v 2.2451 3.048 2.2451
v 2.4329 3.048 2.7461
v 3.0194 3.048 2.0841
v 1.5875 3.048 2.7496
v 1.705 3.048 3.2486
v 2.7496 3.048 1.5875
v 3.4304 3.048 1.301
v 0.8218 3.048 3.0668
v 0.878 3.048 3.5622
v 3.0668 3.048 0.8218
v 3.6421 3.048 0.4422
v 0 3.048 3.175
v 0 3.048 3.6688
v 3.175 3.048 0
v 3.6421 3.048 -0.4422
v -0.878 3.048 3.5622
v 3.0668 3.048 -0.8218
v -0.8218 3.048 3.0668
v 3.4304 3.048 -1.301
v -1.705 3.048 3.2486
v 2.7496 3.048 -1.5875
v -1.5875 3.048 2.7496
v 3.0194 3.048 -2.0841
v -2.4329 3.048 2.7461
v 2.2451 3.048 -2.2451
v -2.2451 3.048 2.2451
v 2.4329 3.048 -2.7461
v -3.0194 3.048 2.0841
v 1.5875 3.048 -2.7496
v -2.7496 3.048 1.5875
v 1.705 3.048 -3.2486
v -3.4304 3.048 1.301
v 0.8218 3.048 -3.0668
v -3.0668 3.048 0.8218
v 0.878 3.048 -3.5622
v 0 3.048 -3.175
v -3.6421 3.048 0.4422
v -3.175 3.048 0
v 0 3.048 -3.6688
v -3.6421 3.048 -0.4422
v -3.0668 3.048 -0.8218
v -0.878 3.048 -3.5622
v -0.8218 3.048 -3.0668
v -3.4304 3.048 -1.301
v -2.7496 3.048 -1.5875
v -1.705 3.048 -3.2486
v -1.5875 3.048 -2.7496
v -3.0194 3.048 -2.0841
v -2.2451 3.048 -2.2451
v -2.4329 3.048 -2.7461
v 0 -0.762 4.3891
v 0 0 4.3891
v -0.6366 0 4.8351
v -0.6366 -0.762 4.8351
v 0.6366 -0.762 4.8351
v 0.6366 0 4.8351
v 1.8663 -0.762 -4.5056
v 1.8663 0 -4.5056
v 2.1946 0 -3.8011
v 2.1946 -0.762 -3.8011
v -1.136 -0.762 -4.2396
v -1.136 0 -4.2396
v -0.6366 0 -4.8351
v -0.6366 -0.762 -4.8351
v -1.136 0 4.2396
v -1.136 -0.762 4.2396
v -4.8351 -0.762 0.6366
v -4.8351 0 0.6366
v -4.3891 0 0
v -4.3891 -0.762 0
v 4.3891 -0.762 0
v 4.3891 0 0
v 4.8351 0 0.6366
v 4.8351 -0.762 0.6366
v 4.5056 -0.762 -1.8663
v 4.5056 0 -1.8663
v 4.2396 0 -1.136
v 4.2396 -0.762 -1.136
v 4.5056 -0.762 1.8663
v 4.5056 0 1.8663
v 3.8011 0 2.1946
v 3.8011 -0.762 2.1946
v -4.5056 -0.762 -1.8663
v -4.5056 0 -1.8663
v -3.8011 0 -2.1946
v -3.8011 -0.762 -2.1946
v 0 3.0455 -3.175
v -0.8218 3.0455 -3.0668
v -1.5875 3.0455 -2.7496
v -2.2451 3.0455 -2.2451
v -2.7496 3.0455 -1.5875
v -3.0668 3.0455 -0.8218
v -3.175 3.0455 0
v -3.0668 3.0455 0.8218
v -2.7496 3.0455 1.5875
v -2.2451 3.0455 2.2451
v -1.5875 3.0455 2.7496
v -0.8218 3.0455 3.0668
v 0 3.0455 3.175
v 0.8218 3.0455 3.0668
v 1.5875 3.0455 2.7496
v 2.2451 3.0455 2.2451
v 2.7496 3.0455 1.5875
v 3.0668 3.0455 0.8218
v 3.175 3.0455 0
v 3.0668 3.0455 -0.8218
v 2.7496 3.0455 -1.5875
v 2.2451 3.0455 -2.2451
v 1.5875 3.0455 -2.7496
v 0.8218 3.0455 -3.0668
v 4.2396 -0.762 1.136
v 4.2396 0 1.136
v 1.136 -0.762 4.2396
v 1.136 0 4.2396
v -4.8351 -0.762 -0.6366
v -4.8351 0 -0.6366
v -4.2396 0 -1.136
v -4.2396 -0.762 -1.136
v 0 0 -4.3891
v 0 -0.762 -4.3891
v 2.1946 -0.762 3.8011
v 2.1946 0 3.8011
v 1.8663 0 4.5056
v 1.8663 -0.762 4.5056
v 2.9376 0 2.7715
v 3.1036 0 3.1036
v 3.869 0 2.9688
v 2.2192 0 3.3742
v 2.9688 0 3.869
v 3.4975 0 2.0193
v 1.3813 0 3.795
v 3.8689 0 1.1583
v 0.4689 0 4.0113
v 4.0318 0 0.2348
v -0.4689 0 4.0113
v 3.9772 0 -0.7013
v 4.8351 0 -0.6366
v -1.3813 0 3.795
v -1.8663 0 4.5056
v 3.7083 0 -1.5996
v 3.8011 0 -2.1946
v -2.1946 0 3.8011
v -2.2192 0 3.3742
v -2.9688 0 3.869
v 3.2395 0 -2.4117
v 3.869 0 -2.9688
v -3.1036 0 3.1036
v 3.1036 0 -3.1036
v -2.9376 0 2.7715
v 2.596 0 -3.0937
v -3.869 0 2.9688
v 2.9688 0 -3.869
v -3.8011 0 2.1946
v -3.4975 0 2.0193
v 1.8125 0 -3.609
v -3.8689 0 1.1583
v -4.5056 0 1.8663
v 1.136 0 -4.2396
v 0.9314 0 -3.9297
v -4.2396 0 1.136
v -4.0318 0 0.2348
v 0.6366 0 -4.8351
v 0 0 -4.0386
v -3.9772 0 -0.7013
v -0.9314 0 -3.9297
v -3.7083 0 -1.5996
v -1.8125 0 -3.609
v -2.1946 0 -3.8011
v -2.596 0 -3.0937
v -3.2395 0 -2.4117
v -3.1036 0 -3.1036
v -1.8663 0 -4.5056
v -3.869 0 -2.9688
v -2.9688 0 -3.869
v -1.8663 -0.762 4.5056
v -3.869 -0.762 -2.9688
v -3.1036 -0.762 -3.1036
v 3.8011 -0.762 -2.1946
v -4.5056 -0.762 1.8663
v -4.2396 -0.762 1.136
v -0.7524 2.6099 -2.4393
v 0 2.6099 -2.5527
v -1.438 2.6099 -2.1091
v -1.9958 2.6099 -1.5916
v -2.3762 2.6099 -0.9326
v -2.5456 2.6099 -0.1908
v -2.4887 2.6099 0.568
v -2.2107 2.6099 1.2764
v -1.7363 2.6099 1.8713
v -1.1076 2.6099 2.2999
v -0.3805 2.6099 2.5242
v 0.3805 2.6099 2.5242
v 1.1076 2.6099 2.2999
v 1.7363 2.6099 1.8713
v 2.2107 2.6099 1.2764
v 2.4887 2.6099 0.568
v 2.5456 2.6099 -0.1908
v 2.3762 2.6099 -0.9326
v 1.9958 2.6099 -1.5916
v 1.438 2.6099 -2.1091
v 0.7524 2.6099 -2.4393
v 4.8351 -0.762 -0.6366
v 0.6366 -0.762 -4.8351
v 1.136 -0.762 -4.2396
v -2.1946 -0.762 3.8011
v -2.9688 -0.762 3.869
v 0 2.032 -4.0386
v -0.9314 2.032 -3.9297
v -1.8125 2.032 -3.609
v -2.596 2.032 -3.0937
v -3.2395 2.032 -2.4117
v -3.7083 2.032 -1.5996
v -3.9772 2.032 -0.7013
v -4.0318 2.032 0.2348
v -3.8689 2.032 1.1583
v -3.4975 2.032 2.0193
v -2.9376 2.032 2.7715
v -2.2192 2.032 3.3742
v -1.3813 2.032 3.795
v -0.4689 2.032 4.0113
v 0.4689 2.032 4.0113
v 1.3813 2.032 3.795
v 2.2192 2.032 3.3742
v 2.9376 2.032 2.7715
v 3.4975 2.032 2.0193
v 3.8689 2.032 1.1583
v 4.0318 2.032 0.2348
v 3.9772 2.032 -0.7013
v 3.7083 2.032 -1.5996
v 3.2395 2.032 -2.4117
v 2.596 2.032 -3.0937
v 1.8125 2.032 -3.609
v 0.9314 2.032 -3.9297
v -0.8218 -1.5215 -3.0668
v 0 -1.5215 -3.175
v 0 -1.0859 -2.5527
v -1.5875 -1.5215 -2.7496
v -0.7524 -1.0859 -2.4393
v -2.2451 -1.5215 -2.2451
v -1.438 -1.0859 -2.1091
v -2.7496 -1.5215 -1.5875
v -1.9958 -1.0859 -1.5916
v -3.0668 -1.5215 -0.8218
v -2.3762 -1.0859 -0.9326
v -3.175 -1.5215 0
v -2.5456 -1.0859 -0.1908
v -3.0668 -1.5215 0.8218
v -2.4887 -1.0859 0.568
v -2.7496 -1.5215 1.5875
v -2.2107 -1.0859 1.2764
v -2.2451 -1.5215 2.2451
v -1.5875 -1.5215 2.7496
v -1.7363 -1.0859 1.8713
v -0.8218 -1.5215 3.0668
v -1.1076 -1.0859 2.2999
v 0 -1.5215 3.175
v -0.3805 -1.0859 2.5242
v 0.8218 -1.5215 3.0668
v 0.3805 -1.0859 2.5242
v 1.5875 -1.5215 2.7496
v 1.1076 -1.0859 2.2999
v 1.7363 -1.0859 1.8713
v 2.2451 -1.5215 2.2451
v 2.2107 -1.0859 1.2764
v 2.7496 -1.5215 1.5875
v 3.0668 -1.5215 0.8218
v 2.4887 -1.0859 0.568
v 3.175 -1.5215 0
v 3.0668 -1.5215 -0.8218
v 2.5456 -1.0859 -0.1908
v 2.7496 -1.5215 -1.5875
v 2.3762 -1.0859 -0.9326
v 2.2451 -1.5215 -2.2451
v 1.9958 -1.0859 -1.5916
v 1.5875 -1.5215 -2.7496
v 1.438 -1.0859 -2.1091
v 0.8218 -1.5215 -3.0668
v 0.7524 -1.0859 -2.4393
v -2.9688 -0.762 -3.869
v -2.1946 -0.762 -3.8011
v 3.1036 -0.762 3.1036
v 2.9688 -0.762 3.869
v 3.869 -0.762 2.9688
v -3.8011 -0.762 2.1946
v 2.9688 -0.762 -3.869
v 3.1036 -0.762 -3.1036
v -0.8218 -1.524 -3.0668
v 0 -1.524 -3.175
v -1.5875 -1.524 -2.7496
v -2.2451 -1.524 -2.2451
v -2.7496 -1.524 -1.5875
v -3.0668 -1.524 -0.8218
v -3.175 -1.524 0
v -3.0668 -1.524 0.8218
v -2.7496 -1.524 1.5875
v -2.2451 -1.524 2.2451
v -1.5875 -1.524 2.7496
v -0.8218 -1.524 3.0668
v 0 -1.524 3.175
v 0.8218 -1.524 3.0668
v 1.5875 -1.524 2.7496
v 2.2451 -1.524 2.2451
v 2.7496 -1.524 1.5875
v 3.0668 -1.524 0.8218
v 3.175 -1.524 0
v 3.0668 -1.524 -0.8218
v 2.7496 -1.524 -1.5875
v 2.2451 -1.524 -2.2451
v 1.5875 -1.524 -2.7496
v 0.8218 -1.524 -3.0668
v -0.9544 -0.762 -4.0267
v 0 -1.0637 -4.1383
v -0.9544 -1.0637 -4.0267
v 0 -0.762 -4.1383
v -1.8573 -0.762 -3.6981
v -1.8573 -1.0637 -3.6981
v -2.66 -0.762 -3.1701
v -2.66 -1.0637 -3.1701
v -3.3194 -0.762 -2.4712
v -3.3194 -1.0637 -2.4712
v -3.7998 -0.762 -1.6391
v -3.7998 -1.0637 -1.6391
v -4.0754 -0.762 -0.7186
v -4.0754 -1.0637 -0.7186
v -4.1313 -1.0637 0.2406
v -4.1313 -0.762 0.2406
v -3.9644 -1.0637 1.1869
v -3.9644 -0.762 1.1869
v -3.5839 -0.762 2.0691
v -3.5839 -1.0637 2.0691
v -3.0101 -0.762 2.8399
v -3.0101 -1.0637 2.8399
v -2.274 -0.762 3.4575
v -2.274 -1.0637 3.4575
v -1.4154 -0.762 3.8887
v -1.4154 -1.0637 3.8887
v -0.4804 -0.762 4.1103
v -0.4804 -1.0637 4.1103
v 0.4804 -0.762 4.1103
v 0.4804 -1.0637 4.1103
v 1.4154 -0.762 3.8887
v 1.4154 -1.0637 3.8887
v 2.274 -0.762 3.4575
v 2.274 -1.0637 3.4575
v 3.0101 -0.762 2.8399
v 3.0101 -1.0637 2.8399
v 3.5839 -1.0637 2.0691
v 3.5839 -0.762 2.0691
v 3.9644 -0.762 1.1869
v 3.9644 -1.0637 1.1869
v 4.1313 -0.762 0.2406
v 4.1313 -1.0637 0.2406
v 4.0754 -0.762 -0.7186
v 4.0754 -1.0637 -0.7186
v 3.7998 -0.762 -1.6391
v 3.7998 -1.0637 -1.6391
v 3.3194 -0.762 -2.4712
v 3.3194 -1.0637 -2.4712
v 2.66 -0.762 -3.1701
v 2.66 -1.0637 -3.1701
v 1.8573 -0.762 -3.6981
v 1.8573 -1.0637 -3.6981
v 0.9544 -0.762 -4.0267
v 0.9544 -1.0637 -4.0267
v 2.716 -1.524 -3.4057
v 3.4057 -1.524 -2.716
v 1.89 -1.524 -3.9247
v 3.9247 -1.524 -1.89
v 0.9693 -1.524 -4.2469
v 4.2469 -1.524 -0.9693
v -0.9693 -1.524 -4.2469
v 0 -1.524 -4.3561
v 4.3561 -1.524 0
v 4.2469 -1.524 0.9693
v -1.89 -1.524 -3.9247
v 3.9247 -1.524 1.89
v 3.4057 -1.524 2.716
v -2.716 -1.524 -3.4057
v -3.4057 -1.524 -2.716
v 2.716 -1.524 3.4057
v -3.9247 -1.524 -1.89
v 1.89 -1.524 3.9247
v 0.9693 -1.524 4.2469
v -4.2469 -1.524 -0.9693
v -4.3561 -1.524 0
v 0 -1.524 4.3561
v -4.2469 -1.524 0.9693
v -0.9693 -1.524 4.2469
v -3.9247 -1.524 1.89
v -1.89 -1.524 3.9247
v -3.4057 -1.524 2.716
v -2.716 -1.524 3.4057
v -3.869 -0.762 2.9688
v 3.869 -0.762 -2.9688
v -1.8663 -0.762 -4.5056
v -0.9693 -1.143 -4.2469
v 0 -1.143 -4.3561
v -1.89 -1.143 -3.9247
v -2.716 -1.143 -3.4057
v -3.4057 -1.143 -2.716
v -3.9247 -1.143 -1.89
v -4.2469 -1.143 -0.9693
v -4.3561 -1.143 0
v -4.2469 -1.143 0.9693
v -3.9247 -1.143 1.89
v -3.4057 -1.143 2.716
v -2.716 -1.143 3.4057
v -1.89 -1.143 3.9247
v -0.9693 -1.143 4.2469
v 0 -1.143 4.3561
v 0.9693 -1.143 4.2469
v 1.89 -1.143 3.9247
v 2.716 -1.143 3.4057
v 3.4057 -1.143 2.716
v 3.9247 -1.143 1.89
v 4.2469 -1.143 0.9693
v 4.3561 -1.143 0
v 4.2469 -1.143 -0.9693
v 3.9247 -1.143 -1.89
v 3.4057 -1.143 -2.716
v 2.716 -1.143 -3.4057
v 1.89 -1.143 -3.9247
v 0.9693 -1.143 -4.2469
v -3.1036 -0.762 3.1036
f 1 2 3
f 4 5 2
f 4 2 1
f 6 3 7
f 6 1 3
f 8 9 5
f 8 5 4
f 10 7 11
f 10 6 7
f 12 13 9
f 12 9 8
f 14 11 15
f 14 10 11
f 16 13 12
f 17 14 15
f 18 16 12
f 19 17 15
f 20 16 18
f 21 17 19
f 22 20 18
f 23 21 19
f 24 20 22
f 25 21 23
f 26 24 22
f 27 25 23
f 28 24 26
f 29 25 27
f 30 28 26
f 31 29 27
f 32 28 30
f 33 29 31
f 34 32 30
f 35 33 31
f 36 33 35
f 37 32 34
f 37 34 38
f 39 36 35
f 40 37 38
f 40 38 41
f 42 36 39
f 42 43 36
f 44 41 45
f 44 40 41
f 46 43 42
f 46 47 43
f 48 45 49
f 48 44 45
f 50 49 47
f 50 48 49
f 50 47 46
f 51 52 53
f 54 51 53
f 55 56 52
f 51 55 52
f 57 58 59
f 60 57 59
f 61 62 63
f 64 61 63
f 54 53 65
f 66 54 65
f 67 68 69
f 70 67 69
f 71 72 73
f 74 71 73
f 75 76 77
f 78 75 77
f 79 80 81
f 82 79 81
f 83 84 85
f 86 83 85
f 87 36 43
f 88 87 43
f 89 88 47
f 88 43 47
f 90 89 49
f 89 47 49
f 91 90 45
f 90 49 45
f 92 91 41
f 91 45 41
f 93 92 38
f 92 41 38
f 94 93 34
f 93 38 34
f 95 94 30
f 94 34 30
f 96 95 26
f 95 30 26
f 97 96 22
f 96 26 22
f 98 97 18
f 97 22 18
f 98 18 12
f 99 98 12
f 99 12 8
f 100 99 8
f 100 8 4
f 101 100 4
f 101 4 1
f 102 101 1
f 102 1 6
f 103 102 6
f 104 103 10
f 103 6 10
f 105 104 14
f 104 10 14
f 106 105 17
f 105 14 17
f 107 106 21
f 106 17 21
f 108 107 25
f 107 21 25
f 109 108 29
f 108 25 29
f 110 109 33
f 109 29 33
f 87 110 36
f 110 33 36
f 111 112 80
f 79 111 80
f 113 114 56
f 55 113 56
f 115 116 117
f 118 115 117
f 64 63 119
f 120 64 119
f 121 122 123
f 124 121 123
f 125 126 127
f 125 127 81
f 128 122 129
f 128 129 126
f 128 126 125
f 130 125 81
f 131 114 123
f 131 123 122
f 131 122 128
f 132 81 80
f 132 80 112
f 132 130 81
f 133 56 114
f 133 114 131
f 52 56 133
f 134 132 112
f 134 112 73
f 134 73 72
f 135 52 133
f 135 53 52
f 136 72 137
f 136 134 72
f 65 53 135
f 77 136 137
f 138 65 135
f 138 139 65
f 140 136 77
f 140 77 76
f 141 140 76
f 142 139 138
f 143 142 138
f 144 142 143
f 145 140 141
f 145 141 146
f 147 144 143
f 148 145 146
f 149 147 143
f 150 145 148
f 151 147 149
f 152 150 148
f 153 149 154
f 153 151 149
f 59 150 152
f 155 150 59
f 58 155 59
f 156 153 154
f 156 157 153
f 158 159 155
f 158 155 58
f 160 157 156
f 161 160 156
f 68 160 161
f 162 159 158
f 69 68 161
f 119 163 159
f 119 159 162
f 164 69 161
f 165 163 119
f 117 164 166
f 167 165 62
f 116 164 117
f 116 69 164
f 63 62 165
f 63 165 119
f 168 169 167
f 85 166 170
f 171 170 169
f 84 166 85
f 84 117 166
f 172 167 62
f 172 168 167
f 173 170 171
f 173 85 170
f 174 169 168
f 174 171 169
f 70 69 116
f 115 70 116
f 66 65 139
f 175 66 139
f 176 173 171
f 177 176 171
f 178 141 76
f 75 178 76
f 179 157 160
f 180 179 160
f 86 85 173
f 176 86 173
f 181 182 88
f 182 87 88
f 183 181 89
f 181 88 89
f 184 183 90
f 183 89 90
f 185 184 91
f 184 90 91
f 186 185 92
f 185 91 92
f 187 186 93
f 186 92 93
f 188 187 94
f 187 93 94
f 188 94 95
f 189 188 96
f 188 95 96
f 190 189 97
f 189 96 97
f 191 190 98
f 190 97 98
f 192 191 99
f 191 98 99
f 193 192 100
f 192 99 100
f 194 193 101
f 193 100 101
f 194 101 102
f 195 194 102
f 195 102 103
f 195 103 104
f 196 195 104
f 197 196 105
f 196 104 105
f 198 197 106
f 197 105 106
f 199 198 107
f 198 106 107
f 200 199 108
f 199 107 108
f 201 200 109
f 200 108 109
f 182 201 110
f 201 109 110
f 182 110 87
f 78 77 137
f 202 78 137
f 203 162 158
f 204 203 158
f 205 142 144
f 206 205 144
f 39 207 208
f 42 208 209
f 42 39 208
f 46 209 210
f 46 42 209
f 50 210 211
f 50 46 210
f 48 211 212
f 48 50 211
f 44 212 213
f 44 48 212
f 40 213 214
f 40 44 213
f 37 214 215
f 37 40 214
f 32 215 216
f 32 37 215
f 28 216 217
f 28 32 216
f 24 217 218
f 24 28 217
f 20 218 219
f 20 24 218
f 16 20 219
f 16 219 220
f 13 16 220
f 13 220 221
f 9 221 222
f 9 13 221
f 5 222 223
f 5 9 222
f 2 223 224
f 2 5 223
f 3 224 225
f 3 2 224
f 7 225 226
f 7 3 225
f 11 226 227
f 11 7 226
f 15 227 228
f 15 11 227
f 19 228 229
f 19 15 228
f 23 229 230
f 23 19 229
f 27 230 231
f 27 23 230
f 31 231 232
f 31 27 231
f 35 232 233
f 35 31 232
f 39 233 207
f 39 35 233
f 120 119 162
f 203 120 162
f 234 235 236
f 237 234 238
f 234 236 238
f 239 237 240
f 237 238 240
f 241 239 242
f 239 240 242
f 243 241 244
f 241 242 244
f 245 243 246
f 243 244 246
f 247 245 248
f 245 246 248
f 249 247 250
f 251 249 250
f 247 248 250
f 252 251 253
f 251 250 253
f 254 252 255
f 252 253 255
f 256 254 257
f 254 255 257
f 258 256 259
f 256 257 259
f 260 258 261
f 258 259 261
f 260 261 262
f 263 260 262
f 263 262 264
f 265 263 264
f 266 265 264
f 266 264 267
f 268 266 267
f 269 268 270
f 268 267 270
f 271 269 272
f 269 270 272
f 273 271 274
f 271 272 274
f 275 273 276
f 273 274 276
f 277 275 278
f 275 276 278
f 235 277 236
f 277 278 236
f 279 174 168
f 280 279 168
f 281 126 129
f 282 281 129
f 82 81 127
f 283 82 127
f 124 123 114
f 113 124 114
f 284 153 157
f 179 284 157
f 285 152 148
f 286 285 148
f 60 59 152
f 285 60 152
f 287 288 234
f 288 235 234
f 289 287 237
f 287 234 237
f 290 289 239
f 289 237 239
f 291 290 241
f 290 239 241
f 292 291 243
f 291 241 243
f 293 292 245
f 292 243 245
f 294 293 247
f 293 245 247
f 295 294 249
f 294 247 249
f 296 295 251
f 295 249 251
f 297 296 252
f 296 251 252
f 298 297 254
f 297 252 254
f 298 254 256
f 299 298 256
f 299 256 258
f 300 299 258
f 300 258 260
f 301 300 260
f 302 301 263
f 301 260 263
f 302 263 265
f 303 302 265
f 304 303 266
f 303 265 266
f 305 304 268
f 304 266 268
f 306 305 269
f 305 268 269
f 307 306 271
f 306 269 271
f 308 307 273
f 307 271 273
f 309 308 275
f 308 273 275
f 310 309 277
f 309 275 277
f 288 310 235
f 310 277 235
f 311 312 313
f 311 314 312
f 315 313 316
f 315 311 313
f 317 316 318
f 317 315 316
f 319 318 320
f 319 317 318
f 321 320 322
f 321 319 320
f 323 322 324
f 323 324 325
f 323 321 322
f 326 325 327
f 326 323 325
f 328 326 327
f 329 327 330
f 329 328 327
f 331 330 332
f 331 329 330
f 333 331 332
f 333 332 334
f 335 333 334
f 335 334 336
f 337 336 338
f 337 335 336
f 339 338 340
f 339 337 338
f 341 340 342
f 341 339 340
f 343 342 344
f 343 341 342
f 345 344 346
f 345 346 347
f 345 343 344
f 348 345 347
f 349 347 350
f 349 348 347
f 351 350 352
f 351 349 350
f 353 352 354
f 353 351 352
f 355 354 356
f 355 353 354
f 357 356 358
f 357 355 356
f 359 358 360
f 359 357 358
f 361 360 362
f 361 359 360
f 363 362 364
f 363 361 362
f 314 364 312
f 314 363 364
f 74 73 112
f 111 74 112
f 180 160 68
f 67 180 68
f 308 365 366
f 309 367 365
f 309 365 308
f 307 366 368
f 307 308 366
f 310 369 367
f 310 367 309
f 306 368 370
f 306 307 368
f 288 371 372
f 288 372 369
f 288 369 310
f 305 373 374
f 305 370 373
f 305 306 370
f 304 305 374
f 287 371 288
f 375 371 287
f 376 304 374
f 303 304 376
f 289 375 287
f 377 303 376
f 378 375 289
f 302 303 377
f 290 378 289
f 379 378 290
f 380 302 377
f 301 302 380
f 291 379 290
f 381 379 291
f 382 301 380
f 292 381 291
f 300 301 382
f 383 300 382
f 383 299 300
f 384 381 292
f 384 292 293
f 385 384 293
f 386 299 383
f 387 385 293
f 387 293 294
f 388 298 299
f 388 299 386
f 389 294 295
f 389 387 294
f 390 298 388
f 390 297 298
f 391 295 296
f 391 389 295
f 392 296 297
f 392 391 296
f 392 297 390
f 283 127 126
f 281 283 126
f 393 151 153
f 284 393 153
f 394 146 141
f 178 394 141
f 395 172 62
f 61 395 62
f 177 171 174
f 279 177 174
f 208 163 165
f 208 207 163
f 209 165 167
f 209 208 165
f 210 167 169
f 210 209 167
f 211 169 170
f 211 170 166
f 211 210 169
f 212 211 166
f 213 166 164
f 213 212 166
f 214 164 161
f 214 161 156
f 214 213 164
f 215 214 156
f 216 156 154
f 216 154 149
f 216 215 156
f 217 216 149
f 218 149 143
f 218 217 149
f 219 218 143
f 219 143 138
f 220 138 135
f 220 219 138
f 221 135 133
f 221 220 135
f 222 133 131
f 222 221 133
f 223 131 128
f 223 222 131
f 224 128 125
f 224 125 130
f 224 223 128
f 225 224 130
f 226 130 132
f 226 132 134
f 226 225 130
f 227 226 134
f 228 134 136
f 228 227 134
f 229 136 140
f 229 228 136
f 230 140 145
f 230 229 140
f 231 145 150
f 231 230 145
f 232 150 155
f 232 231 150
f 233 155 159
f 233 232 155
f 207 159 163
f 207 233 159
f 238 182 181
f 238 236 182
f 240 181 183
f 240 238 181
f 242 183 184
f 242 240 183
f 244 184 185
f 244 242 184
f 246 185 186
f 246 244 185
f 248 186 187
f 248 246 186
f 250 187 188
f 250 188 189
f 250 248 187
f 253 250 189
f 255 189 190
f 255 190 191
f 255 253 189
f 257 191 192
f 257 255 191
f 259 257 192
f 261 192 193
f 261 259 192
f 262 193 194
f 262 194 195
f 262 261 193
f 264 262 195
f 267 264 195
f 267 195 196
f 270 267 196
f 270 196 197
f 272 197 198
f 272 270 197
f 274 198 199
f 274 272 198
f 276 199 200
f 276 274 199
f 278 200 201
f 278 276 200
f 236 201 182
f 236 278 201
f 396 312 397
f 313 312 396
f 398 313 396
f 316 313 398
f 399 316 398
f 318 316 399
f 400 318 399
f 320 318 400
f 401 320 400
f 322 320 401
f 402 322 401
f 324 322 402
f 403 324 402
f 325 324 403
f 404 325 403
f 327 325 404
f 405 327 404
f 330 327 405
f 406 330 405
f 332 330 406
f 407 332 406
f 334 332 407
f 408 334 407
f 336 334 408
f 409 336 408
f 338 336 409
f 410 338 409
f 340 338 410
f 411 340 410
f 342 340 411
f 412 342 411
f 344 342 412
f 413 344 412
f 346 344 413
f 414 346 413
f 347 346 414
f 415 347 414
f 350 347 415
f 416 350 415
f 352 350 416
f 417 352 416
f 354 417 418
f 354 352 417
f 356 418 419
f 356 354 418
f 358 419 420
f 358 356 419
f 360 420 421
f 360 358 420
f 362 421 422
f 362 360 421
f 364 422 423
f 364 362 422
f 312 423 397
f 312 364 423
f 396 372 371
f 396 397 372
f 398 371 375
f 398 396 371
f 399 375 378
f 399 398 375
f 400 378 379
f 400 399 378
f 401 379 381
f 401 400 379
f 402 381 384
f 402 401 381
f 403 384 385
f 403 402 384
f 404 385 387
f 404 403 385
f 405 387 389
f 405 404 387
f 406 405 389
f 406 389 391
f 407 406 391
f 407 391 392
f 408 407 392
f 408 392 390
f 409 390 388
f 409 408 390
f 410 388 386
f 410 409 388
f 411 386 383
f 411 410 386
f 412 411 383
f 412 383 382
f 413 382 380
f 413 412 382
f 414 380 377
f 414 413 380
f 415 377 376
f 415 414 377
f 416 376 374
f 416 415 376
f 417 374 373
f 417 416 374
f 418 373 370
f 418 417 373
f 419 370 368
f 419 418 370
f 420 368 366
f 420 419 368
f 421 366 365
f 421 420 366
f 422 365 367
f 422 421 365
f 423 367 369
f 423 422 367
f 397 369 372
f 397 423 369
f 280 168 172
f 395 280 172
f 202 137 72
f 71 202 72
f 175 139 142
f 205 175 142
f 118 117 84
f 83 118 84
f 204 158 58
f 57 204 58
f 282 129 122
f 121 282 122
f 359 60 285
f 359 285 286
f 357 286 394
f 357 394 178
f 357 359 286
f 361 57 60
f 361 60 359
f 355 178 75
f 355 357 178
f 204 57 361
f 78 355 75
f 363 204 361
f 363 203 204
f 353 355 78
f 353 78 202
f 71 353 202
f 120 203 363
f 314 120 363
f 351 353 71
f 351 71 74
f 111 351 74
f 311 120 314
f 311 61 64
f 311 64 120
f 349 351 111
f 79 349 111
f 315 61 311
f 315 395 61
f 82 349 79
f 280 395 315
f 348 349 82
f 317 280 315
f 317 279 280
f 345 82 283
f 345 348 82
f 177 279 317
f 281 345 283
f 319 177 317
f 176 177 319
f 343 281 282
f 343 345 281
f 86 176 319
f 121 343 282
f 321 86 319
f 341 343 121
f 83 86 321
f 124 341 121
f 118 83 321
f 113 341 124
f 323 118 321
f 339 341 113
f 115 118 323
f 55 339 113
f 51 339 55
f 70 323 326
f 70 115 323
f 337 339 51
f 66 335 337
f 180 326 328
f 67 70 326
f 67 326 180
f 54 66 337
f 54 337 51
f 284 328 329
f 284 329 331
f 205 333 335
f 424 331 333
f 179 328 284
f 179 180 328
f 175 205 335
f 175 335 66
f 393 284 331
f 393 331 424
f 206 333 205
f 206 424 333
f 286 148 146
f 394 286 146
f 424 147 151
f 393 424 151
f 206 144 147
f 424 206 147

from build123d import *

# Parameters (mm, degrees)
CLINCHCUT_START    = -0.762
CLINCHCUT_DEPTH    = 0.762
CLINCHCUTPAT_COUNT = 24
CLINCHCUTPAT_ANGLE = 345


with BuildPart() as part:
    # BodySke → Body (revolve)
    with BuildSketch(Plane.XY, mode=Mode.PRIVATE) as body_sk:
        Polygon((4.138295, -1.063725463), (4.138295, -0.762), (4.8768, -0.762), (4.8768, 0), (4.0386, 0), (4.0386, 2.032), (3.668806242, 3.048), (2.5527, 3.048), (2.5527, -1.524), (4.3561, -1.524), (4.3561, -1.143), align=None)
    revolve(body_sk.sketch.rotate(Axis((0, -1.143, 0), (0, 1, 0)), 90), axis=Axis((0, -1.143, 0), (0, 1, 0)))

    # EndChamferSke → EndChamfer (revolve, cut)
    with BuildSketch(Plane.XY, mode=Mode.PRIVATE) as endchamfer_sk:
        Polygon((3.175, -1.778), (3.175, -1.52146), (2.5527, -1.085882692), (2.5527, -1.778), align=None)
        Polygon((3.175, 3.04546), (3.175, 3.302), (2.5527, 3.302), (2.5527, 2.609882692), align=None)
    revolve(endchamfer_sk.sketch.rotate(Axis((0, -2.54, 0), (0, 1, 0)), 90), axis=Axis((0, -2.54, 0), (0, 1, 0)), mode=Mode.SUBTRACT)

    # CliRinCutSke → ClinchCut (cut)
    with BuildSketch(Plane.XZ.offset(0.762).offset(CLINCHCUT_START)):
        with BuildLine():
            Line((0.636550134, 4.8350783), (0, 4.38912))
            Line((0, 4.38912), (-0.636550134, 4.8350783))
            ThreePointArc((-0.636550134, 4.8350783), (0, 4.8768), (0.636550134, 4.8350783))
        make_face()
    clinchcut = extrude(amount=CLINCHCUT_DEPTH, mode=Mode.SUBTRACT)

    # ClinchCutPat: ClinchCut ×24 about axis
    clinchcutpat_axis = Axis((0, 0, 0), (0, 1, 0))
    for i in range(1, CLINCHCUTPAT_COUNT):
        add(clinchcut.rotate(clinchcutpat_axis, i * CLINCHCUTPAT_ANGLE / (CLINCHCUTPAT_COUNT - 1)), mode=Mode.SUBTRACT)


solid = part.part
